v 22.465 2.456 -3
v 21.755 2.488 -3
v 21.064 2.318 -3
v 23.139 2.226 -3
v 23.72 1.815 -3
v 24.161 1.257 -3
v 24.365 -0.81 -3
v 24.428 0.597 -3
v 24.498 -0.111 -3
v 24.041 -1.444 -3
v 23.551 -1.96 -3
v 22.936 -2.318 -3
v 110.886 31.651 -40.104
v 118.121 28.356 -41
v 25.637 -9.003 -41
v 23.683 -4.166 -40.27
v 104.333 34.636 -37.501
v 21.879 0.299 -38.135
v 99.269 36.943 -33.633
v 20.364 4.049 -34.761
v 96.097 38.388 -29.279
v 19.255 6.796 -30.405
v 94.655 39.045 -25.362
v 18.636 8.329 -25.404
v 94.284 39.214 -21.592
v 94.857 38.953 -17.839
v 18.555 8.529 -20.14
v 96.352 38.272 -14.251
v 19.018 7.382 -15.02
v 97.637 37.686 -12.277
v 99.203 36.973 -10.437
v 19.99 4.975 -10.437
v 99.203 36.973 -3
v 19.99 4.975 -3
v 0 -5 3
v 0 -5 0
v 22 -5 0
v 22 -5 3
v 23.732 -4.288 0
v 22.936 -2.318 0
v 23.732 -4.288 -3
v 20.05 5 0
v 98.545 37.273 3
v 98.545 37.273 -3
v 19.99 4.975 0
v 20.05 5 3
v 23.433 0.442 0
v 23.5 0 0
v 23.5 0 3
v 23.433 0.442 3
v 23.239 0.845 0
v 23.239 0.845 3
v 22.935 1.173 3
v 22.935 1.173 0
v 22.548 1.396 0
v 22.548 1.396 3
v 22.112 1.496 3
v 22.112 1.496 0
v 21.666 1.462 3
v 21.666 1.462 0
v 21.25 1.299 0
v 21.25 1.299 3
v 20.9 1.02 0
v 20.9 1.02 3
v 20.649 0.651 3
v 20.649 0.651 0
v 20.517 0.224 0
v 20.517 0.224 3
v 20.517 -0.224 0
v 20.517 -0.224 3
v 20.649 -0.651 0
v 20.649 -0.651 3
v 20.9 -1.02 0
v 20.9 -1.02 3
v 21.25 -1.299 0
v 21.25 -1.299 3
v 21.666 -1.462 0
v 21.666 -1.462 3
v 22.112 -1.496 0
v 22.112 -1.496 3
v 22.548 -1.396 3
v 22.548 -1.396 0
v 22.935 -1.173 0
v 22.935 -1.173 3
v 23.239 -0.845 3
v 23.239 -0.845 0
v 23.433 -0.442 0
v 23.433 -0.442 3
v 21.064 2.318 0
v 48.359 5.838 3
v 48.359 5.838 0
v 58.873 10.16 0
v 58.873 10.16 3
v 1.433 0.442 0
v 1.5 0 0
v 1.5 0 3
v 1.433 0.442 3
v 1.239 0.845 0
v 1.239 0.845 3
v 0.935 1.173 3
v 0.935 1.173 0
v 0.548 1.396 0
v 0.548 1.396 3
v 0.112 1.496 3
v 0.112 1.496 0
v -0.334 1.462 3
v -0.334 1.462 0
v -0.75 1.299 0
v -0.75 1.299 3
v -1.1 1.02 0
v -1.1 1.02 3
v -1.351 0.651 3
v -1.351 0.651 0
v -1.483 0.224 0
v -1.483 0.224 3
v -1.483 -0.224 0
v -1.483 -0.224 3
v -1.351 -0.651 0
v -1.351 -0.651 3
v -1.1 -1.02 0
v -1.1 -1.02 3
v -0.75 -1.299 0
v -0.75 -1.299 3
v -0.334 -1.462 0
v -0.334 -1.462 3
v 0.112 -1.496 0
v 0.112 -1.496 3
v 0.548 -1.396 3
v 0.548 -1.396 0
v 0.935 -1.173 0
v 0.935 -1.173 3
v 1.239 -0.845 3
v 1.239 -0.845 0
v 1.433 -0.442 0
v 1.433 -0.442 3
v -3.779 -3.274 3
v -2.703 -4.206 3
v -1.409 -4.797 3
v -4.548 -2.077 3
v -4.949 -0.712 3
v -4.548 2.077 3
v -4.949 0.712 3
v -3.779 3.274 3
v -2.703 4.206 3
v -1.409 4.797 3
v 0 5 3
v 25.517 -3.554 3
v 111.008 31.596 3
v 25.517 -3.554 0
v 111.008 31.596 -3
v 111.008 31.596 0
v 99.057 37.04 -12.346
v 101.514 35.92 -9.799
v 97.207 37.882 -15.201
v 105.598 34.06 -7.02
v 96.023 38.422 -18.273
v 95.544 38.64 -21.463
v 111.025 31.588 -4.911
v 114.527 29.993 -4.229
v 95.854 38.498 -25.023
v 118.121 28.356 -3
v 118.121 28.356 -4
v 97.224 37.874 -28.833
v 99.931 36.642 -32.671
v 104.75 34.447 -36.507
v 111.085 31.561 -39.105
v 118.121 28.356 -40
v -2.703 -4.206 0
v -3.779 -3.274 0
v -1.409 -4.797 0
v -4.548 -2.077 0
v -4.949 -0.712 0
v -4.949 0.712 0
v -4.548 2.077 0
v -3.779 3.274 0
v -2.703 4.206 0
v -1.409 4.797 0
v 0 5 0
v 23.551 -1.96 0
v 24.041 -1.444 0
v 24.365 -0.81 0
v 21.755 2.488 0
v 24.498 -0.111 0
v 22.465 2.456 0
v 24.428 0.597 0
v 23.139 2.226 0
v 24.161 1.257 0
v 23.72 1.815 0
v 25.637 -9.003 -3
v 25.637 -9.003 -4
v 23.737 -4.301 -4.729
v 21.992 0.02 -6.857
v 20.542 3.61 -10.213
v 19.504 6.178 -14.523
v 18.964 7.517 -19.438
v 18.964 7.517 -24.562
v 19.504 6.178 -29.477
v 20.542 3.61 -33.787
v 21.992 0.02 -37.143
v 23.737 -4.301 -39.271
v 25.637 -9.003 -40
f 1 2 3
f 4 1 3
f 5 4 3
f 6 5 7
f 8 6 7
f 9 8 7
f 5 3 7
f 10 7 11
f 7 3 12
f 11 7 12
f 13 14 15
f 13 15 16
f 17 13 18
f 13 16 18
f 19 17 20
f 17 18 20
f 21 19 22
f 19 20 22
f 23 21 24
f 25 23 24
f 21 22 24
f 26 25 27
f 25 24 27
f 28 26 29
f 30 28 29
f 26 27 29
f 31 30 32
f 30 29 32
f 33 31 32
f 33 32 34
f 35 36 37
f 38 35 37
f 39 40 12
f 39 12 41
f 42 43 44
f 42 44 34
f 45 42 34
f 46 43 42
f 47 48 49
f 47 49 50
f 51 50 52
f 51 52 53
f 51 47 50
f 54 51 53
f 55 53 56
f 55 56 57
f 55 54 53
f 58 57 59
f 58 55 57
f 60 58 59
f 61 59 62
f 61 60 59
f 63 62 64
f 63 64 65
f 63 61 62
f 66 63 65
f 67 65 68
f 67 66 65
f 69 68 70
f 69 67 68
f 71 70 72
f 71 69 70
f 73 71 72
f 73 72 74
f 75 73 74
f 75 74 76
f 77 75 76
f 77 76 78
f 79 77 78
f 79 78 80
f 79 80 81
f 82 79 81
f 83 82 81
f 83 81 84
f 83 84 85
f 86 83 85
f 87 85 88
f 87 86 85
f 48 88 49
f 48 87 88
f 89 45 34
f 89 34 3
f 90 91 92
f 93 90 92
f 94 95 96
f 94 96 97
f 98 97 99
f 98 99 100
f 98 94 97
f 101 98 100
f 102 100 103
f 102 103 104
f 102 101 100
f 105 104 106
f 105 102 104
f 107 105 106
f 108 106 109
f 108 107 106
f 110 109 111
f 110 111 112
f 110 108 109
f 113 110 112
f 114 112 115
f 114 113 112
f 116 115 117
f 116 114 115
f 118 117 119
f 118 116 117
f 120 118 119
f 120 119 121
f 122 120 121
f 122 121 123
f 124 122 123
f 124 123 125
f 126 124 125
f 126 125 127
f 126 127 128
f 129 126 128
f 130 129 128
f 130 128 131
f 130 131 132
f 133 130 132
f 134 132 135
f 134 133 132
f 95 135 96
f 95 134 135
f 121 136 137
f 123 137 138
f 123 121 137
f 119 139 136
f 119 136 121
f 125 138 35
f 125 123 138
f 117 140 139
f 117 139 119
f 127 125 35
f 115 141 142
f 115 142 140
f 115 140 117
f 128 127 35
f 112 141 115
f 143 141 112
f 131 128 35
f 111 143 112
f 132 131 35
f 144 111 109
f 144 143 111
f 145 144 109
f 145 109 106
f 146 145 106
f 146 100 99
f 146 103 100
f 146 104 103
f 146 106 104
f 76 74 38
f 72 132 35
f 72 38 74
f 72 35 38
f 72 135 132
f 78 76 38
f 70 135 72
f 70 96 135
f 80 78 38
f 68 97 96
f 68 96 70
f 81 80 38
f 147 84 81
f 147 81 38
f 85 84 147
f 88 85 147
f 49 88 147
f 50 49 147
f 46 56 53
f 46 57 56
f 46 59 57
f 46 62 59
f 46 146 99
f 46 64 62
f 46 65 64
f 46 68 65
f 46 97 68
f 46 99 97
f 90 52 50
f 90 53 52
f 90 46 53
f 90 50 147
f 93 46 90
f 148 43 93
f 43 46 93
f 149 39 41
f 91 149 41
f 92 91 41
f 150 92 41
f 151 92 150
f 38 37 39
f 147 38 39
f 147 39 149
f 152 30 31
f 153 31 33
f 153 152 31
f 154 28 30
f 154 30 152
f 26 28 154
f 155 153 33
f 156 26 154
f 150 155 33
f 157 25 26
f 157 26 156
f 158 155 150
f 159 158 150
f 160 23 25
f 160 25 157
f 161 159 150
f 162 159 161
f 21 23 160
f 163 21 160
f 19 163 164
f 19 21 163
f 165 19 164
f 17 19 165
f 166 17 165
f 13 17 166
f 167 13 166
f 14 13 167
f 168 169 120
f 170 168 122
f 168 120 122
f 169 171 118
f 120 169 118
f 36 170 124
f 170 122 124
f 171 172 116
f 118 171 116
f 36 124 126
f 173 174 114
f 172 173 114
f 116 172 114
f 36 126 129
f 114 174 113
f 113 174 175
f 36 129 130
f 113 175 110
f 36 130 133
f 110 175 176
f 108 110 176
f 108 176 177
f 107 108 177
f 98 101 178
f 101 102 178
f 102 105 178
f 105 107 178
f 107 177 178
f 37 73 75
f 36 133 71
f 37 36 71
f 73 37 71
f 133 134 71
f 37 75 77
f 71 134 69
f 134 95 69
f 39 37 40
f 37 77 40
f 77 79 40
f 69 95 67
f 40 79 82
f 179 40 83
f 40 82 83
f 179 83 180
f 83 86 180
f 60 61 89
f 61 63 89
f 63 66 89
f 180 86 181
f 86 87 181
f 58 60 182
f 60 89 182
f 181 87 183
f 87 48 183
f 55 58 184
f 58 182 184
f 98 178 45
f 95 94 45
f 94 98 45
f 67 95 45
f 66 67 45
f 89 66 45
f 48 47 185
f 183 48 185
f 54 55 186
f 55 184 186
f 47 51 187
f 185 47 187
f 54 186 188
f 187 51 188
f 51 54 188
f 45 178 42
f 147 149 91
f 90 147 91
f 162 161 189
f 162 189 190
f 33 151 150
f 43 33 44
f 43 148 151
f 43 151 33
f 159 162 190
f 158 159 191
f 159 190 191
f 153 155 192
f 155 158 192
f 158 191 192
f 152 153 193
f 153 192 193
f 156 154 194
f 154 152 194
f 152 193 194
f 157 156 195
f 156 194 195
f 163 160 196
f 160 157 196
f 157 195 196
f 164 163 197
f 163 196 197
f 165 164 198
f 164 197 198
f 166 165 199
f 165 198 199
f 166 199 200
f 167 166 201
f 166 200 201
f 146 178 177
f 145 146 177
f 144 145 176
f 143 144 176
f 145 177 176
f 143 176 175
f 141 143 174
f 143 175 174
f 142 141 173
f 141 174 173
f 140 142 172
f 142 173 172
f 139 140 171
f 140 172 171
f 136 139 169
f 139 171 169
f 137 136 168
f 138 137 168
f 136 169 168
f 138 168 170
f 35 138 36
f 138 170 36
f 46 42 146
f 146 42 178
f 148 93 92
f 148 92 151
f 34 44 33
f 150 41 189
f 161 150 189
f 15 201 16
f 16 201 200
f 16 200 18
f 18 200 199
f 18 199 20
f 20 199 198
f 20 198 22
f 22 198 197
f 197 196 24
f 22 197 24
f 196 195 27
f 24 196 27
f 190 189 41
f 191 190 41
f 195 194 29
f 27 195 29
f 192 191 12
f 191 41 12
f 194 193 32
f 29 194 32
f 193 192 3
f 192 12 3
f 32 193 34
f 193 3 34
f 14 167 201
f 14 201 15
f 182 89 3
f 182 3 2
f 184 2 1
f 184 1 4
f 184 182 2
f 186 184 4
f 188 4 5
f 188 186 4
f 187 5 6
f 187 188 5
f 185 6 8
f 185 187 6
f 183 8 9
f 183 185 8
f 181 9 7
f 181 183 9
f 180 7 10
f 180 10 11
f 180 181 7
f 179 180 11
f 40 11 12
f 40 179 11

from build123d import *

# Parameters (mm, degrees)
SKETCH1_R           = 1.5
BOSS_EXTRUDE1_DEPTH = 3
EXTRUDE_1_DEPTH     = 3
EXTRUDE_2_DEPTH     = 3
EXTRUDE_3_REACH     = 100.745


with BuildPart() as part:
    # Sketch1 → Boss-Extrude1 (new body)
    # profile 1 of 2: a face of its own
    with BuildSketch(Plane.XY):
        with BuildLine():
            Line((20.05, 5), (0, 5))
            ThreePointArc((0, 5), (-5, 0), (0, -5))
            Line((0, -5), (22, -5))
            Line((22, -5), (25.516973514, -3.553997369))
            ThreePointArc((25.516973514, -3.553997369), (26.624391141, 1.901317064), (22, 5))
            Line((22, 5), (20.05, 5))
        make_face()
        Circle(SKETCH1_R, mode=Mode.SUBTRACT)
        with Locations((22, 0)):
            Circle(SKETCH1_R, mode=Mode.SUBTRACT)
    # profile 2 of 2: a face of its own
    with BuildSketch(Plane.XY):
        with BuildLine():
            Line((46.409029503, 15.837507263), (20.05, 5))
            Line((20.05, 5), (22, 5))
            ThreePointArc((22, 5), (26.624391141, 1.901317064), (25.516973514, -3.553997369))
            Line((25.516973514, -3.553997369), (48.359029503, 5.837507263))
            Line((48.359029503, 5.837507263), (58.872830999, 10.16025367))
            Line((58.872830999, 10.16025367), (53.359871826, 12.67140304))
            Line((53.359871826, 12.67140304), (46.409029503, 15.837507263))
        make_face()
    extrude(amount=BOSS_EXTRUDE1_DEPTH)

    # 草图1 → 凸台-拉伸1 (add)
    with BuildSketch(Plane.XY.offset(3)):
        Polygon((46.409029503, 15.837507263), (58.872830999, 10.16025367), (111.008388469, 31.59577286), (98.544586973, 37.273026453), align=None)
    extrude(amount=-EXTRUDE_1_DEPTH)

    # 草图4 → 凸台-拉伸2 (add)
    with BuildSketch(Plane(origin=(0, 0, 0), x_dir=(-1, 0, 0), z_dir=(0, 0, -1))):
        with BuildLine():
            Line((-111.008388469, 31.59577286), (-98.544586973, 37.273026453))
            Line((-98.544586973, 37.273026453), (-19.990187018, 4.97540791))
            Line((-19.990187018, 4.97540791), (-21.063636635, 2.318021494))
            ThreePointArc((-21.063636635, 2.318021494), (-24.318021494, 0.936363365), (-22.936363365, -2.318021494))
            Line((-22.936363365, -2.318021494), (-23.732077199, -4.287856967))
            Line((-23.732077199, -4.287856967), (-111.008388469, 31.59577286))
        make_face()
    extrude(amount=EXTRUDE_2_DEPTH)

    # 凸台-拉伸3: up to this plane
    extrude_3_end = Plane(origin=(98.544586973, 37.273026453, -70.058401543), z_dir=(0.4145222599320868, 0.9100391727946636, 0))
    # 草图5 → 凸台-拉伸3 (add, up to the surface)
    with BuildSketch(Plane(origin=(18.913747244, 7.640196631, 0), x_dir=(0.3745453459539944, -0.9272085977945863, 0), z_dir=(-0.9272085977945863, -0.3745453459539944, 0)), mode=Mode.PRIVATE) as extrude_3_sk1:
        with BuildLine():
            Line((17.949999281, -3), (17.949999281, -4))
            ThreePointArc((17.949999281, -4), (-0.050000719, -22), (17.949999281, -40))
            Line((17.949999281, -40), (17.949999281, -41))
            ThreePointArc((17.949999281, -41), (0.910251194, -30.405176091), (2.873990521, -10.43652475))
            Line((2.873990521, -10.43652475), (2.873990521, -3))
            Line((2.873990521, -3), (17.949999281, -3))
        make_face()
    extrude_3_tool1 = split(extrude(extrude_3_sk1.sketch, amount=-EXTRUDE_3_REACH, mode=Mode.PRIVATE), bisect_by=extrude_3_end, keep=Keep.BOTH, mode=Mode.PRIVATE)
    add(extrude_3_tool1.solids().sort_by_distance((20.149314, 4.581481, -6.718262))[0])


solid = part.part
